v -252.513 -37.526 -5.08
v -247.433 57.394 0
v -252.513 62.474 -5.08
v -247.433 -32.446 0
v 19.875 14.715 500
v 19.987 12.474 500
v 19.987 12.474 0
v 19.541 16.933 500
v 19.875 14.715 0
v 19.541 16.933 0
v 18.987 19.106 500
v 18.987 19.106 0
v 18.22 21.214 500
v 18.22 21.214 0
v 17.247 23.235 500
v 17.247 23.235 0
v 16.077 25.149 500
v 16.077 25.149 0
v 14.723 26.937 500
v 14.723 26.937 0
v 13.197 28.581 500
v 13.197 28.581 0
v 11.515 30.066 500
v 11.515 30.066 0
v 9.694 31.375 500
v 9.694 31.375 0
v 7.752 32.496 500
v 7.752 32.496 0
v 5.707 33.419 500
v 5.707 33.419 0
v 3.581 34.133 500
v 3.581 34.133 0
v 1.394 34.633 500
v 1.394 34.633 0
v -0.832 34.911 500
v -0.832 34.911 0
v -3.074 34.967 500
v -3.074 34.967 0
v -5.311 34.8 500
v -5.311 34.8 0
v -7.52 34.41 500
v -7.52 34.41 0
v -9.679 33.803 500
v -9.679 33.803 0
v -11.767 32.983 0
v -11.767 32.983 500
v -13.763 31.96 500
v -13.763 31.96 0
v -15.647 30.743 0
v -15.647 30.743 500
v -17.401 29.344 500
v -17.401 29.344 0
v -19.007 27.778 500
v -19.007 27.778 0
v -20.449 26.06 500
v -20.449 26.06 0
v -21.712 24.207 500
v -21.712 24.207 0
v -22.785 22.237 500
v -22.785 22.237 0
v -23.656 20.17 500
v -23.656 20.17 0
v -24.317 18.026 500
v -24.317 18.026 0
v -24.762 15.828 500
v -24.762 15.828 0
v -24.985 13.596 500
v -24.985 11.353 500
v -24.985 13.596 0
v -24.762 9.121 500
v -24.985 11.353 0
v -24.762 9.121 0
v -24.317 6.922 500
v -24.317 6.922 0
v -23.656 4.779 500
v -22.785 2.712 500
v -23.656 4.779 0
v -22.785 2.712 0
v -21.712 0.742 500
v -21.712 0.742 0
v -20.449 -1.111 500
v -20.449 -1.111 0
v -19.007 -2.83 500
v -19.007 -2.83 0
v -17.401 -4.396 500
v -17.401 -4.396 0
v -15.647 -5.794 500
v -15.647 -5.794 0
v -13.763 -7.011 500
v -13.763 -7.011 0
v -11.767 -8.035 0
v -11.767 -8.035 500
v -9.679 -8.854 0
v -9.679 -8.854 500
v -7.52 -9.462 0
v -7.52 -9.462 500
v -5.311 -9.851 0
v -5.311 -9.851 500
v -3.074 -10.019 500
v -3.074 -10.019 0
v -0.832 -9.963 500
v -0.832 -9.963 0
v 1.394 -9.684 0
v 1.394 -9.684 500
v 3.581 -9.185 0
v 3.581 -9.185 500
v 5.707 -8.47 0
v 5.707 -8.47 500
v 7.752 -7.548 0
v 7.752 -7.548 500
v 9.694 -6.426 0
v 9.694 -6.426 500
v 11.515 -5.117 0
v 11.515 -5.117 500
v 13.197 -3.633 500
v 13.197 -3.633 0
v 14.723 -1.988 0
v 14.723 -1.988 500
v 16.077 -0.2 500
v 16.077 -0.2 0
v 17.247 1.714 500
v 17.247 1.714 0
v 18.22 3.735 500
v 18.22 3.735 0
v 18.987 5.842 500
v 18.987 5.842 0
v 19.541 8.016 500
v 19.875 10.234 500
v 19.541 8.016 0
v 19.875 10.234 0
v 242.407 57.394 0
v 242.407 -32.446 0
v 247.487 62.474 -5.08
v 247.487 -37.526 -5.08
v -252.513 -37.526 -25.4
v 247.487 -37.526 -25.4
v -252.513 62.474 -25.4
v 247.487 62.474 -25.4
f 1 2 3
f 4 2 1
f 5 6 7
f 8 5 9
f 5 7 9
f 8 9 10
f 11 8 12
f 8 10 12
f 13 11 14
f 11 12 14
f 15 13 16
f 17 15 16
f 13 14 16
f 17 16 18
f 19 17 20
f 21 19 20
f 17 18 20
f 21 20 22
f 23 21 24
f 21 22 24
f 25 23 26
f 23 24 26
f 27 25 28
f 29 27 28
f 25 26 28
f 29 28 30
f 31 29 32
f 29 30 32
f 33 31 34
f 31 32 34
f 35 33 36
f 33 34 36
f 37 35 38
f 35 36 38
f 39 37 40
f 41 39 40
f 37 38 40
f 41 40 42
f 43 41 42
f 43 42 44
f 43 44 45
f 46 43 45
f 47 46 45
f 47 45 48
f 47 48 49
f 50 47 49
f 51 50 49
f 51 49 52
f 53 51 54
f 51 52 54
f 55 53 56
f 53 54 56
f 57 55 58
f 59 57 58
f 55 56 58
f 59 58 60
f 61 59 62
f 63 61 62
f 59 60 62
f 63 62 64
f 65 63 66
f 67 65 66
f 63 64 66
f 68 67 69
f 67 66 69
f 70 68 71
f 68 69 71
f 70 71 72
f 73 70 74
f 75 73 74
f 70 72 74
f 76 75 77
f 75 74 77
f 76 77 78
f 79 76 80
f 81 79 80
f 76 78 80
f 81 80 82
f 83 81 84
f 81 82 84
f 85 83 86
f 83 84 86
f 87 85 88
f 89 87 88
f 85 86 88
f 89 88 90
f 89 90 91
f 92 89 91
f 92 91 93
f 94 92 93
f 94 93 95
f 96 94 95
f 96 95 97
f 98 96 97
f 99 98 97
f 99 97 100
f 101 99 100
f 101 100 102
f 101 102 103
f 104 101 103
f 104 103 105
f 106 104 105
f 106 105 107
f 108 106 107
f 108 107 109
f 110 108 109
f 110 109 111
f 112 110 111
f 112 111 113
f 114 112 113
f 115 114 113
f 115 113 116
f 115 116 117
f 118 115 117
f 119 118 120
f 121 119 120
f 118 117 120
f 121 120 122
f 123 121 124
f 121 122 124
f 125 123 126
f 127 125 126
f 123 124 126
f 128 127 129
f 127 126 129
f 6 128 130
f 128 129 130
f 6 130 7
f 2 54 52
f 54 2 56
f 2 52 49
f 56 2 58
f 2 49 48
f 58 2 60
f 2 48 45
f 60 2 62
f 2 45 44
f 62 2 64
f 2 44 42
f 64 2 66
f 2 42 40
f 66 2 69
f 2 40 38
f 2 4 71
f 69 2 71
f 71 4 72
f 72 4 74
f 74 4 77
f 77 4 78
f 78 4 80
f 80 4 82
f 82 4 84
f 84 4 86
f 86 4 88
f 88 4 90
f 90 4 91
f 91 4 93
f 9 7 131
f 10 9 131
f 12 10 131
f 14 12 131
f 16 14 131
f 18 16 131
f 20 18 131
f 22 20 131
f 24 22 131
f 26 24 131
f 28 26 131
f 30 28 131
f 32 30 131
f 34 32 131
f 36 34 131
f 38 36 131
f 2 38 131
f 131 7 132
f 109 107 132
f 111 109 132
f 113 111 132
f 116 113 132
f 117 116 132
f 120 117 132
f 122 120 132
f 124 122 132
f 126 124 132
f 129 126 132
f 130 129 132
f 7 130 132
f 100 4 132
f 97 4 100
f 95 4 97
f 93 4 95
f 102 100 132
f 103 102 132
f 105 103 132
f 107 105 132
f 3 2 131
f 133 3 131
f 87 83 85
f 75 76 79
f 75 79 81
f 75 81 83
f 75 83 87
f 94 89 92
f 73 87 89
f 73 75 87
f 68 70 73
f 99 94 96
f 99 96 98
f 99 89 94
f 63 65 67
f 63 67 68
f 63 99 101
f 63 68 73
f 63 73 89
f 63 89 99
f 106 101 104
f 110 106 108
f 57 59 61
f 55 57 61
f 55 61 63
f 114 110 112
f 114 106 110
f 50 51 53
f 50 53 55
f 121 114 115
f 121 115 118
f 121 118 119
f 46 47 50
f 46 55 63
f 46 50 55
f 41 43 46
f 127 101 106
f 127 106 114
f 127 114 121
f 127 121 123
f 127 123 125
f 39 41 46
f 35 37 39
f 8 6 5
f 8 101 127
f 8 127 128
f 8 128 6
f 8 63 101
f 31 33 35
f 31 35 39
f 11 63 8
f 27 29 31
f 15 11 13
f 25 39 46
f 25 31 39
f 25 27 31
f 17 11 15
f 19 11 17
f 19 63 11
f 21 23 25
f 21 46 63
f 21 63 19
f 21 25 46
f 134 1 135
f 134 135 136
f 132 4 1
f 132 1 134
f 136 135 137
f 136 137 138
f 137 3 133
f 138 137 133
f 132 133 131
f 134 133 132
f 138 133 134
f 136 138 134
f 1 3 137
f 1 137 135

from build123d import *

# Parameters (mm, degrees)
F0_R     = 22.5
F1_DEPTH = 500
F2_W     = 500
F2_H     = 100
F3_DEPTH = 25.4
F4_SIZE  = 5.08


with BuildPart() as f1:
    # F0 (on Top) → F1 (new body)
    with BuildSketch(Plane.XY):
        with Locations((-2.513092, 12.474374)):
            Circle(F0_R)
    extrude(amount=F1_DEPTH)

    # F2 (on face) → F3 (join)
    with BuildSketch(Plane(origin=(0, 0, 0), x_dir=(1, 0, 0), z_dir=(0, 0, -1))):
        with Locations((-2.513092, -12.474374)):
            Rectangle(F2_W, F2_H)
    extrude(amount=F3_DEPTH)

    # F4
    f4_edges = [f1.edges().sort_by_distance(p)[0] for p in [
        (-2.513092, -37.525626, 0),
        (-252.513092, 12.474374, 0),
        (-2.513092, 62.474374, 0),
        (247.486908, 12.474374, 0),
    ]]
    chamfer(f4_edges, length=F4_SIZE)


solid = f1.part
